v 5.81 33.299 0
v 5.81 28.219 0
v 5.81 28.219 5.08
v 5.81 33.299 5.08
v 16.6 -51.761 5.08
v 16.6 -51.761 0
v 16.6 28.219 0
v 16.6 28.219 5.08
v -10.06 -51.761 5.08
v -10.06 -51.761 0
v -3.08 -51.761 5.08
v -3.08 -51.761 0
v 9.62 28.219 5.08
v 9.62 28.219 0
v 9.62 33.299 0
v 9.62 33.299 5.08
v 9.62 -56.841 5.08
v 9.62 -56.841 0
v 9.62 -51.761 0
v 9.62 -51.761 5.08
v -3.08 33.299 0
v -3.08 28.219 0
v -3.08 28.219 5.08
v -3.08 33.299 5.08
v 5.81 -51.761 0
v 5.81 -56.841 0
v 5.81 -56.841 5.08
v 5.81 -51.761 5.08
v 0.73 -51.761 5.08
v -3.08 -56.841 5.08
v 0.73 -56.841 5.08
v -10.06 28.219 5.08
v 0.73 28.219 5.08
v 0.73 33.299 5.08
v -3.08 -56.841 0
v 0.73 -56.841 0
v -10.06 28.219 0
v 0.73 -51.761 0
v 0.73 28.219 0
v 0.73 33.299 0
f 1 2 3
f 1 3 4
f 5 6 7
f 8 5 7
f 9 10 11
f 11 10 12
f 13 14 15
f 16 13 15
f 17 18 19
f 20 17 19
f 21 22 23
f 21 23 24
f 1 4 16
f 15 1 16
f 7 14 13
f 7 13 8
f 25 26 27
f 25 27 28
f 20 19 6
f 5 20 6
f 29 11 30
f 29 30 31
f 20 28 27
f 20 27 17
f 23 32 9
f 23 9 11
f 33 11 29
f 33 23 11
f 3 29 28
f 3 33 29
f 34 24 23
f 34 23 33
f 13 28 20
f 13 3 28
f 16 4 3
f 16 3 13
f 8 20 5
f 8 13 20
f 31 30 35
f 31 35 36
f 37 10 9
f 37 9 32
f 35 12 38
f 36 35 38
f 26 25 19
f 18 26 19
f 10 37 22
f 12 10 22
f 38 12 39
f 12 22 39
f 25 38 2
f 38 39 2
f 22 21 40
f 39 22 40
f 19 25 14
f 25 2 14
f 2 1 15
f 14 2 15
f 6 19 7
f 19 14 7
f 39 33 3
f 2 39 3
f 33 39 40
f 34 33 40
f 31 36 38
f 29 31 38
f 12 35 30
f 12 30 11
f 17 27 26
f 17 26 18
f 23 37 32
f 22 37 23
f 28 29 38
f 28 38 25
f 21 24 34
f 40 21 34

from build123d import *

# Parameters (mm, degrees)
SKETCH1_W           = 26.66
SKETCH1_H           = 79.98
BOSS_EXTRUDE1_DEPTH = 5.08
SKETCH2_W           = 3.81
SKETCH2_H           = 5.08
BOSS_EXTRUDE2_DEPTH = 5.08


with BuildPart() as part:
    # Sketch1 → Boss-Extrude1 (new body)
    with BuildSketch(Plane.XY):
        with Locations((3.269622642, -11.770641509)):
            Rectangle(SKETCH1_W, SKETCH1_H)
    extrude(amount=BOSS_EXTRUDE1_DEPTH)

    # Sketch2 → Boss-Extrude2 (add)
    with BuildSketch(Plane.XY.offset(5.08)):
        with Locations((-1.175377358, -54.300641509)):
            Rectangle(SKETCH2_W, SKETCH2_H)
        with Locations((7.714622642, 30.759358491)):
            Rectangle(SKETCH2_W, SKETCH2_H)
        with Locations((-1.175377358, 30.759358491)):
            Rectangle(SKETCH2_W, SKETCH2_H)
        with Locations((7.714622642, -54.300641509)):
            Rectangle(SKETCH2_W, SKETCH2_H)
    extrude(amount=-BOSS_EXTRUDE2_DEPTH)


solid = part.part
